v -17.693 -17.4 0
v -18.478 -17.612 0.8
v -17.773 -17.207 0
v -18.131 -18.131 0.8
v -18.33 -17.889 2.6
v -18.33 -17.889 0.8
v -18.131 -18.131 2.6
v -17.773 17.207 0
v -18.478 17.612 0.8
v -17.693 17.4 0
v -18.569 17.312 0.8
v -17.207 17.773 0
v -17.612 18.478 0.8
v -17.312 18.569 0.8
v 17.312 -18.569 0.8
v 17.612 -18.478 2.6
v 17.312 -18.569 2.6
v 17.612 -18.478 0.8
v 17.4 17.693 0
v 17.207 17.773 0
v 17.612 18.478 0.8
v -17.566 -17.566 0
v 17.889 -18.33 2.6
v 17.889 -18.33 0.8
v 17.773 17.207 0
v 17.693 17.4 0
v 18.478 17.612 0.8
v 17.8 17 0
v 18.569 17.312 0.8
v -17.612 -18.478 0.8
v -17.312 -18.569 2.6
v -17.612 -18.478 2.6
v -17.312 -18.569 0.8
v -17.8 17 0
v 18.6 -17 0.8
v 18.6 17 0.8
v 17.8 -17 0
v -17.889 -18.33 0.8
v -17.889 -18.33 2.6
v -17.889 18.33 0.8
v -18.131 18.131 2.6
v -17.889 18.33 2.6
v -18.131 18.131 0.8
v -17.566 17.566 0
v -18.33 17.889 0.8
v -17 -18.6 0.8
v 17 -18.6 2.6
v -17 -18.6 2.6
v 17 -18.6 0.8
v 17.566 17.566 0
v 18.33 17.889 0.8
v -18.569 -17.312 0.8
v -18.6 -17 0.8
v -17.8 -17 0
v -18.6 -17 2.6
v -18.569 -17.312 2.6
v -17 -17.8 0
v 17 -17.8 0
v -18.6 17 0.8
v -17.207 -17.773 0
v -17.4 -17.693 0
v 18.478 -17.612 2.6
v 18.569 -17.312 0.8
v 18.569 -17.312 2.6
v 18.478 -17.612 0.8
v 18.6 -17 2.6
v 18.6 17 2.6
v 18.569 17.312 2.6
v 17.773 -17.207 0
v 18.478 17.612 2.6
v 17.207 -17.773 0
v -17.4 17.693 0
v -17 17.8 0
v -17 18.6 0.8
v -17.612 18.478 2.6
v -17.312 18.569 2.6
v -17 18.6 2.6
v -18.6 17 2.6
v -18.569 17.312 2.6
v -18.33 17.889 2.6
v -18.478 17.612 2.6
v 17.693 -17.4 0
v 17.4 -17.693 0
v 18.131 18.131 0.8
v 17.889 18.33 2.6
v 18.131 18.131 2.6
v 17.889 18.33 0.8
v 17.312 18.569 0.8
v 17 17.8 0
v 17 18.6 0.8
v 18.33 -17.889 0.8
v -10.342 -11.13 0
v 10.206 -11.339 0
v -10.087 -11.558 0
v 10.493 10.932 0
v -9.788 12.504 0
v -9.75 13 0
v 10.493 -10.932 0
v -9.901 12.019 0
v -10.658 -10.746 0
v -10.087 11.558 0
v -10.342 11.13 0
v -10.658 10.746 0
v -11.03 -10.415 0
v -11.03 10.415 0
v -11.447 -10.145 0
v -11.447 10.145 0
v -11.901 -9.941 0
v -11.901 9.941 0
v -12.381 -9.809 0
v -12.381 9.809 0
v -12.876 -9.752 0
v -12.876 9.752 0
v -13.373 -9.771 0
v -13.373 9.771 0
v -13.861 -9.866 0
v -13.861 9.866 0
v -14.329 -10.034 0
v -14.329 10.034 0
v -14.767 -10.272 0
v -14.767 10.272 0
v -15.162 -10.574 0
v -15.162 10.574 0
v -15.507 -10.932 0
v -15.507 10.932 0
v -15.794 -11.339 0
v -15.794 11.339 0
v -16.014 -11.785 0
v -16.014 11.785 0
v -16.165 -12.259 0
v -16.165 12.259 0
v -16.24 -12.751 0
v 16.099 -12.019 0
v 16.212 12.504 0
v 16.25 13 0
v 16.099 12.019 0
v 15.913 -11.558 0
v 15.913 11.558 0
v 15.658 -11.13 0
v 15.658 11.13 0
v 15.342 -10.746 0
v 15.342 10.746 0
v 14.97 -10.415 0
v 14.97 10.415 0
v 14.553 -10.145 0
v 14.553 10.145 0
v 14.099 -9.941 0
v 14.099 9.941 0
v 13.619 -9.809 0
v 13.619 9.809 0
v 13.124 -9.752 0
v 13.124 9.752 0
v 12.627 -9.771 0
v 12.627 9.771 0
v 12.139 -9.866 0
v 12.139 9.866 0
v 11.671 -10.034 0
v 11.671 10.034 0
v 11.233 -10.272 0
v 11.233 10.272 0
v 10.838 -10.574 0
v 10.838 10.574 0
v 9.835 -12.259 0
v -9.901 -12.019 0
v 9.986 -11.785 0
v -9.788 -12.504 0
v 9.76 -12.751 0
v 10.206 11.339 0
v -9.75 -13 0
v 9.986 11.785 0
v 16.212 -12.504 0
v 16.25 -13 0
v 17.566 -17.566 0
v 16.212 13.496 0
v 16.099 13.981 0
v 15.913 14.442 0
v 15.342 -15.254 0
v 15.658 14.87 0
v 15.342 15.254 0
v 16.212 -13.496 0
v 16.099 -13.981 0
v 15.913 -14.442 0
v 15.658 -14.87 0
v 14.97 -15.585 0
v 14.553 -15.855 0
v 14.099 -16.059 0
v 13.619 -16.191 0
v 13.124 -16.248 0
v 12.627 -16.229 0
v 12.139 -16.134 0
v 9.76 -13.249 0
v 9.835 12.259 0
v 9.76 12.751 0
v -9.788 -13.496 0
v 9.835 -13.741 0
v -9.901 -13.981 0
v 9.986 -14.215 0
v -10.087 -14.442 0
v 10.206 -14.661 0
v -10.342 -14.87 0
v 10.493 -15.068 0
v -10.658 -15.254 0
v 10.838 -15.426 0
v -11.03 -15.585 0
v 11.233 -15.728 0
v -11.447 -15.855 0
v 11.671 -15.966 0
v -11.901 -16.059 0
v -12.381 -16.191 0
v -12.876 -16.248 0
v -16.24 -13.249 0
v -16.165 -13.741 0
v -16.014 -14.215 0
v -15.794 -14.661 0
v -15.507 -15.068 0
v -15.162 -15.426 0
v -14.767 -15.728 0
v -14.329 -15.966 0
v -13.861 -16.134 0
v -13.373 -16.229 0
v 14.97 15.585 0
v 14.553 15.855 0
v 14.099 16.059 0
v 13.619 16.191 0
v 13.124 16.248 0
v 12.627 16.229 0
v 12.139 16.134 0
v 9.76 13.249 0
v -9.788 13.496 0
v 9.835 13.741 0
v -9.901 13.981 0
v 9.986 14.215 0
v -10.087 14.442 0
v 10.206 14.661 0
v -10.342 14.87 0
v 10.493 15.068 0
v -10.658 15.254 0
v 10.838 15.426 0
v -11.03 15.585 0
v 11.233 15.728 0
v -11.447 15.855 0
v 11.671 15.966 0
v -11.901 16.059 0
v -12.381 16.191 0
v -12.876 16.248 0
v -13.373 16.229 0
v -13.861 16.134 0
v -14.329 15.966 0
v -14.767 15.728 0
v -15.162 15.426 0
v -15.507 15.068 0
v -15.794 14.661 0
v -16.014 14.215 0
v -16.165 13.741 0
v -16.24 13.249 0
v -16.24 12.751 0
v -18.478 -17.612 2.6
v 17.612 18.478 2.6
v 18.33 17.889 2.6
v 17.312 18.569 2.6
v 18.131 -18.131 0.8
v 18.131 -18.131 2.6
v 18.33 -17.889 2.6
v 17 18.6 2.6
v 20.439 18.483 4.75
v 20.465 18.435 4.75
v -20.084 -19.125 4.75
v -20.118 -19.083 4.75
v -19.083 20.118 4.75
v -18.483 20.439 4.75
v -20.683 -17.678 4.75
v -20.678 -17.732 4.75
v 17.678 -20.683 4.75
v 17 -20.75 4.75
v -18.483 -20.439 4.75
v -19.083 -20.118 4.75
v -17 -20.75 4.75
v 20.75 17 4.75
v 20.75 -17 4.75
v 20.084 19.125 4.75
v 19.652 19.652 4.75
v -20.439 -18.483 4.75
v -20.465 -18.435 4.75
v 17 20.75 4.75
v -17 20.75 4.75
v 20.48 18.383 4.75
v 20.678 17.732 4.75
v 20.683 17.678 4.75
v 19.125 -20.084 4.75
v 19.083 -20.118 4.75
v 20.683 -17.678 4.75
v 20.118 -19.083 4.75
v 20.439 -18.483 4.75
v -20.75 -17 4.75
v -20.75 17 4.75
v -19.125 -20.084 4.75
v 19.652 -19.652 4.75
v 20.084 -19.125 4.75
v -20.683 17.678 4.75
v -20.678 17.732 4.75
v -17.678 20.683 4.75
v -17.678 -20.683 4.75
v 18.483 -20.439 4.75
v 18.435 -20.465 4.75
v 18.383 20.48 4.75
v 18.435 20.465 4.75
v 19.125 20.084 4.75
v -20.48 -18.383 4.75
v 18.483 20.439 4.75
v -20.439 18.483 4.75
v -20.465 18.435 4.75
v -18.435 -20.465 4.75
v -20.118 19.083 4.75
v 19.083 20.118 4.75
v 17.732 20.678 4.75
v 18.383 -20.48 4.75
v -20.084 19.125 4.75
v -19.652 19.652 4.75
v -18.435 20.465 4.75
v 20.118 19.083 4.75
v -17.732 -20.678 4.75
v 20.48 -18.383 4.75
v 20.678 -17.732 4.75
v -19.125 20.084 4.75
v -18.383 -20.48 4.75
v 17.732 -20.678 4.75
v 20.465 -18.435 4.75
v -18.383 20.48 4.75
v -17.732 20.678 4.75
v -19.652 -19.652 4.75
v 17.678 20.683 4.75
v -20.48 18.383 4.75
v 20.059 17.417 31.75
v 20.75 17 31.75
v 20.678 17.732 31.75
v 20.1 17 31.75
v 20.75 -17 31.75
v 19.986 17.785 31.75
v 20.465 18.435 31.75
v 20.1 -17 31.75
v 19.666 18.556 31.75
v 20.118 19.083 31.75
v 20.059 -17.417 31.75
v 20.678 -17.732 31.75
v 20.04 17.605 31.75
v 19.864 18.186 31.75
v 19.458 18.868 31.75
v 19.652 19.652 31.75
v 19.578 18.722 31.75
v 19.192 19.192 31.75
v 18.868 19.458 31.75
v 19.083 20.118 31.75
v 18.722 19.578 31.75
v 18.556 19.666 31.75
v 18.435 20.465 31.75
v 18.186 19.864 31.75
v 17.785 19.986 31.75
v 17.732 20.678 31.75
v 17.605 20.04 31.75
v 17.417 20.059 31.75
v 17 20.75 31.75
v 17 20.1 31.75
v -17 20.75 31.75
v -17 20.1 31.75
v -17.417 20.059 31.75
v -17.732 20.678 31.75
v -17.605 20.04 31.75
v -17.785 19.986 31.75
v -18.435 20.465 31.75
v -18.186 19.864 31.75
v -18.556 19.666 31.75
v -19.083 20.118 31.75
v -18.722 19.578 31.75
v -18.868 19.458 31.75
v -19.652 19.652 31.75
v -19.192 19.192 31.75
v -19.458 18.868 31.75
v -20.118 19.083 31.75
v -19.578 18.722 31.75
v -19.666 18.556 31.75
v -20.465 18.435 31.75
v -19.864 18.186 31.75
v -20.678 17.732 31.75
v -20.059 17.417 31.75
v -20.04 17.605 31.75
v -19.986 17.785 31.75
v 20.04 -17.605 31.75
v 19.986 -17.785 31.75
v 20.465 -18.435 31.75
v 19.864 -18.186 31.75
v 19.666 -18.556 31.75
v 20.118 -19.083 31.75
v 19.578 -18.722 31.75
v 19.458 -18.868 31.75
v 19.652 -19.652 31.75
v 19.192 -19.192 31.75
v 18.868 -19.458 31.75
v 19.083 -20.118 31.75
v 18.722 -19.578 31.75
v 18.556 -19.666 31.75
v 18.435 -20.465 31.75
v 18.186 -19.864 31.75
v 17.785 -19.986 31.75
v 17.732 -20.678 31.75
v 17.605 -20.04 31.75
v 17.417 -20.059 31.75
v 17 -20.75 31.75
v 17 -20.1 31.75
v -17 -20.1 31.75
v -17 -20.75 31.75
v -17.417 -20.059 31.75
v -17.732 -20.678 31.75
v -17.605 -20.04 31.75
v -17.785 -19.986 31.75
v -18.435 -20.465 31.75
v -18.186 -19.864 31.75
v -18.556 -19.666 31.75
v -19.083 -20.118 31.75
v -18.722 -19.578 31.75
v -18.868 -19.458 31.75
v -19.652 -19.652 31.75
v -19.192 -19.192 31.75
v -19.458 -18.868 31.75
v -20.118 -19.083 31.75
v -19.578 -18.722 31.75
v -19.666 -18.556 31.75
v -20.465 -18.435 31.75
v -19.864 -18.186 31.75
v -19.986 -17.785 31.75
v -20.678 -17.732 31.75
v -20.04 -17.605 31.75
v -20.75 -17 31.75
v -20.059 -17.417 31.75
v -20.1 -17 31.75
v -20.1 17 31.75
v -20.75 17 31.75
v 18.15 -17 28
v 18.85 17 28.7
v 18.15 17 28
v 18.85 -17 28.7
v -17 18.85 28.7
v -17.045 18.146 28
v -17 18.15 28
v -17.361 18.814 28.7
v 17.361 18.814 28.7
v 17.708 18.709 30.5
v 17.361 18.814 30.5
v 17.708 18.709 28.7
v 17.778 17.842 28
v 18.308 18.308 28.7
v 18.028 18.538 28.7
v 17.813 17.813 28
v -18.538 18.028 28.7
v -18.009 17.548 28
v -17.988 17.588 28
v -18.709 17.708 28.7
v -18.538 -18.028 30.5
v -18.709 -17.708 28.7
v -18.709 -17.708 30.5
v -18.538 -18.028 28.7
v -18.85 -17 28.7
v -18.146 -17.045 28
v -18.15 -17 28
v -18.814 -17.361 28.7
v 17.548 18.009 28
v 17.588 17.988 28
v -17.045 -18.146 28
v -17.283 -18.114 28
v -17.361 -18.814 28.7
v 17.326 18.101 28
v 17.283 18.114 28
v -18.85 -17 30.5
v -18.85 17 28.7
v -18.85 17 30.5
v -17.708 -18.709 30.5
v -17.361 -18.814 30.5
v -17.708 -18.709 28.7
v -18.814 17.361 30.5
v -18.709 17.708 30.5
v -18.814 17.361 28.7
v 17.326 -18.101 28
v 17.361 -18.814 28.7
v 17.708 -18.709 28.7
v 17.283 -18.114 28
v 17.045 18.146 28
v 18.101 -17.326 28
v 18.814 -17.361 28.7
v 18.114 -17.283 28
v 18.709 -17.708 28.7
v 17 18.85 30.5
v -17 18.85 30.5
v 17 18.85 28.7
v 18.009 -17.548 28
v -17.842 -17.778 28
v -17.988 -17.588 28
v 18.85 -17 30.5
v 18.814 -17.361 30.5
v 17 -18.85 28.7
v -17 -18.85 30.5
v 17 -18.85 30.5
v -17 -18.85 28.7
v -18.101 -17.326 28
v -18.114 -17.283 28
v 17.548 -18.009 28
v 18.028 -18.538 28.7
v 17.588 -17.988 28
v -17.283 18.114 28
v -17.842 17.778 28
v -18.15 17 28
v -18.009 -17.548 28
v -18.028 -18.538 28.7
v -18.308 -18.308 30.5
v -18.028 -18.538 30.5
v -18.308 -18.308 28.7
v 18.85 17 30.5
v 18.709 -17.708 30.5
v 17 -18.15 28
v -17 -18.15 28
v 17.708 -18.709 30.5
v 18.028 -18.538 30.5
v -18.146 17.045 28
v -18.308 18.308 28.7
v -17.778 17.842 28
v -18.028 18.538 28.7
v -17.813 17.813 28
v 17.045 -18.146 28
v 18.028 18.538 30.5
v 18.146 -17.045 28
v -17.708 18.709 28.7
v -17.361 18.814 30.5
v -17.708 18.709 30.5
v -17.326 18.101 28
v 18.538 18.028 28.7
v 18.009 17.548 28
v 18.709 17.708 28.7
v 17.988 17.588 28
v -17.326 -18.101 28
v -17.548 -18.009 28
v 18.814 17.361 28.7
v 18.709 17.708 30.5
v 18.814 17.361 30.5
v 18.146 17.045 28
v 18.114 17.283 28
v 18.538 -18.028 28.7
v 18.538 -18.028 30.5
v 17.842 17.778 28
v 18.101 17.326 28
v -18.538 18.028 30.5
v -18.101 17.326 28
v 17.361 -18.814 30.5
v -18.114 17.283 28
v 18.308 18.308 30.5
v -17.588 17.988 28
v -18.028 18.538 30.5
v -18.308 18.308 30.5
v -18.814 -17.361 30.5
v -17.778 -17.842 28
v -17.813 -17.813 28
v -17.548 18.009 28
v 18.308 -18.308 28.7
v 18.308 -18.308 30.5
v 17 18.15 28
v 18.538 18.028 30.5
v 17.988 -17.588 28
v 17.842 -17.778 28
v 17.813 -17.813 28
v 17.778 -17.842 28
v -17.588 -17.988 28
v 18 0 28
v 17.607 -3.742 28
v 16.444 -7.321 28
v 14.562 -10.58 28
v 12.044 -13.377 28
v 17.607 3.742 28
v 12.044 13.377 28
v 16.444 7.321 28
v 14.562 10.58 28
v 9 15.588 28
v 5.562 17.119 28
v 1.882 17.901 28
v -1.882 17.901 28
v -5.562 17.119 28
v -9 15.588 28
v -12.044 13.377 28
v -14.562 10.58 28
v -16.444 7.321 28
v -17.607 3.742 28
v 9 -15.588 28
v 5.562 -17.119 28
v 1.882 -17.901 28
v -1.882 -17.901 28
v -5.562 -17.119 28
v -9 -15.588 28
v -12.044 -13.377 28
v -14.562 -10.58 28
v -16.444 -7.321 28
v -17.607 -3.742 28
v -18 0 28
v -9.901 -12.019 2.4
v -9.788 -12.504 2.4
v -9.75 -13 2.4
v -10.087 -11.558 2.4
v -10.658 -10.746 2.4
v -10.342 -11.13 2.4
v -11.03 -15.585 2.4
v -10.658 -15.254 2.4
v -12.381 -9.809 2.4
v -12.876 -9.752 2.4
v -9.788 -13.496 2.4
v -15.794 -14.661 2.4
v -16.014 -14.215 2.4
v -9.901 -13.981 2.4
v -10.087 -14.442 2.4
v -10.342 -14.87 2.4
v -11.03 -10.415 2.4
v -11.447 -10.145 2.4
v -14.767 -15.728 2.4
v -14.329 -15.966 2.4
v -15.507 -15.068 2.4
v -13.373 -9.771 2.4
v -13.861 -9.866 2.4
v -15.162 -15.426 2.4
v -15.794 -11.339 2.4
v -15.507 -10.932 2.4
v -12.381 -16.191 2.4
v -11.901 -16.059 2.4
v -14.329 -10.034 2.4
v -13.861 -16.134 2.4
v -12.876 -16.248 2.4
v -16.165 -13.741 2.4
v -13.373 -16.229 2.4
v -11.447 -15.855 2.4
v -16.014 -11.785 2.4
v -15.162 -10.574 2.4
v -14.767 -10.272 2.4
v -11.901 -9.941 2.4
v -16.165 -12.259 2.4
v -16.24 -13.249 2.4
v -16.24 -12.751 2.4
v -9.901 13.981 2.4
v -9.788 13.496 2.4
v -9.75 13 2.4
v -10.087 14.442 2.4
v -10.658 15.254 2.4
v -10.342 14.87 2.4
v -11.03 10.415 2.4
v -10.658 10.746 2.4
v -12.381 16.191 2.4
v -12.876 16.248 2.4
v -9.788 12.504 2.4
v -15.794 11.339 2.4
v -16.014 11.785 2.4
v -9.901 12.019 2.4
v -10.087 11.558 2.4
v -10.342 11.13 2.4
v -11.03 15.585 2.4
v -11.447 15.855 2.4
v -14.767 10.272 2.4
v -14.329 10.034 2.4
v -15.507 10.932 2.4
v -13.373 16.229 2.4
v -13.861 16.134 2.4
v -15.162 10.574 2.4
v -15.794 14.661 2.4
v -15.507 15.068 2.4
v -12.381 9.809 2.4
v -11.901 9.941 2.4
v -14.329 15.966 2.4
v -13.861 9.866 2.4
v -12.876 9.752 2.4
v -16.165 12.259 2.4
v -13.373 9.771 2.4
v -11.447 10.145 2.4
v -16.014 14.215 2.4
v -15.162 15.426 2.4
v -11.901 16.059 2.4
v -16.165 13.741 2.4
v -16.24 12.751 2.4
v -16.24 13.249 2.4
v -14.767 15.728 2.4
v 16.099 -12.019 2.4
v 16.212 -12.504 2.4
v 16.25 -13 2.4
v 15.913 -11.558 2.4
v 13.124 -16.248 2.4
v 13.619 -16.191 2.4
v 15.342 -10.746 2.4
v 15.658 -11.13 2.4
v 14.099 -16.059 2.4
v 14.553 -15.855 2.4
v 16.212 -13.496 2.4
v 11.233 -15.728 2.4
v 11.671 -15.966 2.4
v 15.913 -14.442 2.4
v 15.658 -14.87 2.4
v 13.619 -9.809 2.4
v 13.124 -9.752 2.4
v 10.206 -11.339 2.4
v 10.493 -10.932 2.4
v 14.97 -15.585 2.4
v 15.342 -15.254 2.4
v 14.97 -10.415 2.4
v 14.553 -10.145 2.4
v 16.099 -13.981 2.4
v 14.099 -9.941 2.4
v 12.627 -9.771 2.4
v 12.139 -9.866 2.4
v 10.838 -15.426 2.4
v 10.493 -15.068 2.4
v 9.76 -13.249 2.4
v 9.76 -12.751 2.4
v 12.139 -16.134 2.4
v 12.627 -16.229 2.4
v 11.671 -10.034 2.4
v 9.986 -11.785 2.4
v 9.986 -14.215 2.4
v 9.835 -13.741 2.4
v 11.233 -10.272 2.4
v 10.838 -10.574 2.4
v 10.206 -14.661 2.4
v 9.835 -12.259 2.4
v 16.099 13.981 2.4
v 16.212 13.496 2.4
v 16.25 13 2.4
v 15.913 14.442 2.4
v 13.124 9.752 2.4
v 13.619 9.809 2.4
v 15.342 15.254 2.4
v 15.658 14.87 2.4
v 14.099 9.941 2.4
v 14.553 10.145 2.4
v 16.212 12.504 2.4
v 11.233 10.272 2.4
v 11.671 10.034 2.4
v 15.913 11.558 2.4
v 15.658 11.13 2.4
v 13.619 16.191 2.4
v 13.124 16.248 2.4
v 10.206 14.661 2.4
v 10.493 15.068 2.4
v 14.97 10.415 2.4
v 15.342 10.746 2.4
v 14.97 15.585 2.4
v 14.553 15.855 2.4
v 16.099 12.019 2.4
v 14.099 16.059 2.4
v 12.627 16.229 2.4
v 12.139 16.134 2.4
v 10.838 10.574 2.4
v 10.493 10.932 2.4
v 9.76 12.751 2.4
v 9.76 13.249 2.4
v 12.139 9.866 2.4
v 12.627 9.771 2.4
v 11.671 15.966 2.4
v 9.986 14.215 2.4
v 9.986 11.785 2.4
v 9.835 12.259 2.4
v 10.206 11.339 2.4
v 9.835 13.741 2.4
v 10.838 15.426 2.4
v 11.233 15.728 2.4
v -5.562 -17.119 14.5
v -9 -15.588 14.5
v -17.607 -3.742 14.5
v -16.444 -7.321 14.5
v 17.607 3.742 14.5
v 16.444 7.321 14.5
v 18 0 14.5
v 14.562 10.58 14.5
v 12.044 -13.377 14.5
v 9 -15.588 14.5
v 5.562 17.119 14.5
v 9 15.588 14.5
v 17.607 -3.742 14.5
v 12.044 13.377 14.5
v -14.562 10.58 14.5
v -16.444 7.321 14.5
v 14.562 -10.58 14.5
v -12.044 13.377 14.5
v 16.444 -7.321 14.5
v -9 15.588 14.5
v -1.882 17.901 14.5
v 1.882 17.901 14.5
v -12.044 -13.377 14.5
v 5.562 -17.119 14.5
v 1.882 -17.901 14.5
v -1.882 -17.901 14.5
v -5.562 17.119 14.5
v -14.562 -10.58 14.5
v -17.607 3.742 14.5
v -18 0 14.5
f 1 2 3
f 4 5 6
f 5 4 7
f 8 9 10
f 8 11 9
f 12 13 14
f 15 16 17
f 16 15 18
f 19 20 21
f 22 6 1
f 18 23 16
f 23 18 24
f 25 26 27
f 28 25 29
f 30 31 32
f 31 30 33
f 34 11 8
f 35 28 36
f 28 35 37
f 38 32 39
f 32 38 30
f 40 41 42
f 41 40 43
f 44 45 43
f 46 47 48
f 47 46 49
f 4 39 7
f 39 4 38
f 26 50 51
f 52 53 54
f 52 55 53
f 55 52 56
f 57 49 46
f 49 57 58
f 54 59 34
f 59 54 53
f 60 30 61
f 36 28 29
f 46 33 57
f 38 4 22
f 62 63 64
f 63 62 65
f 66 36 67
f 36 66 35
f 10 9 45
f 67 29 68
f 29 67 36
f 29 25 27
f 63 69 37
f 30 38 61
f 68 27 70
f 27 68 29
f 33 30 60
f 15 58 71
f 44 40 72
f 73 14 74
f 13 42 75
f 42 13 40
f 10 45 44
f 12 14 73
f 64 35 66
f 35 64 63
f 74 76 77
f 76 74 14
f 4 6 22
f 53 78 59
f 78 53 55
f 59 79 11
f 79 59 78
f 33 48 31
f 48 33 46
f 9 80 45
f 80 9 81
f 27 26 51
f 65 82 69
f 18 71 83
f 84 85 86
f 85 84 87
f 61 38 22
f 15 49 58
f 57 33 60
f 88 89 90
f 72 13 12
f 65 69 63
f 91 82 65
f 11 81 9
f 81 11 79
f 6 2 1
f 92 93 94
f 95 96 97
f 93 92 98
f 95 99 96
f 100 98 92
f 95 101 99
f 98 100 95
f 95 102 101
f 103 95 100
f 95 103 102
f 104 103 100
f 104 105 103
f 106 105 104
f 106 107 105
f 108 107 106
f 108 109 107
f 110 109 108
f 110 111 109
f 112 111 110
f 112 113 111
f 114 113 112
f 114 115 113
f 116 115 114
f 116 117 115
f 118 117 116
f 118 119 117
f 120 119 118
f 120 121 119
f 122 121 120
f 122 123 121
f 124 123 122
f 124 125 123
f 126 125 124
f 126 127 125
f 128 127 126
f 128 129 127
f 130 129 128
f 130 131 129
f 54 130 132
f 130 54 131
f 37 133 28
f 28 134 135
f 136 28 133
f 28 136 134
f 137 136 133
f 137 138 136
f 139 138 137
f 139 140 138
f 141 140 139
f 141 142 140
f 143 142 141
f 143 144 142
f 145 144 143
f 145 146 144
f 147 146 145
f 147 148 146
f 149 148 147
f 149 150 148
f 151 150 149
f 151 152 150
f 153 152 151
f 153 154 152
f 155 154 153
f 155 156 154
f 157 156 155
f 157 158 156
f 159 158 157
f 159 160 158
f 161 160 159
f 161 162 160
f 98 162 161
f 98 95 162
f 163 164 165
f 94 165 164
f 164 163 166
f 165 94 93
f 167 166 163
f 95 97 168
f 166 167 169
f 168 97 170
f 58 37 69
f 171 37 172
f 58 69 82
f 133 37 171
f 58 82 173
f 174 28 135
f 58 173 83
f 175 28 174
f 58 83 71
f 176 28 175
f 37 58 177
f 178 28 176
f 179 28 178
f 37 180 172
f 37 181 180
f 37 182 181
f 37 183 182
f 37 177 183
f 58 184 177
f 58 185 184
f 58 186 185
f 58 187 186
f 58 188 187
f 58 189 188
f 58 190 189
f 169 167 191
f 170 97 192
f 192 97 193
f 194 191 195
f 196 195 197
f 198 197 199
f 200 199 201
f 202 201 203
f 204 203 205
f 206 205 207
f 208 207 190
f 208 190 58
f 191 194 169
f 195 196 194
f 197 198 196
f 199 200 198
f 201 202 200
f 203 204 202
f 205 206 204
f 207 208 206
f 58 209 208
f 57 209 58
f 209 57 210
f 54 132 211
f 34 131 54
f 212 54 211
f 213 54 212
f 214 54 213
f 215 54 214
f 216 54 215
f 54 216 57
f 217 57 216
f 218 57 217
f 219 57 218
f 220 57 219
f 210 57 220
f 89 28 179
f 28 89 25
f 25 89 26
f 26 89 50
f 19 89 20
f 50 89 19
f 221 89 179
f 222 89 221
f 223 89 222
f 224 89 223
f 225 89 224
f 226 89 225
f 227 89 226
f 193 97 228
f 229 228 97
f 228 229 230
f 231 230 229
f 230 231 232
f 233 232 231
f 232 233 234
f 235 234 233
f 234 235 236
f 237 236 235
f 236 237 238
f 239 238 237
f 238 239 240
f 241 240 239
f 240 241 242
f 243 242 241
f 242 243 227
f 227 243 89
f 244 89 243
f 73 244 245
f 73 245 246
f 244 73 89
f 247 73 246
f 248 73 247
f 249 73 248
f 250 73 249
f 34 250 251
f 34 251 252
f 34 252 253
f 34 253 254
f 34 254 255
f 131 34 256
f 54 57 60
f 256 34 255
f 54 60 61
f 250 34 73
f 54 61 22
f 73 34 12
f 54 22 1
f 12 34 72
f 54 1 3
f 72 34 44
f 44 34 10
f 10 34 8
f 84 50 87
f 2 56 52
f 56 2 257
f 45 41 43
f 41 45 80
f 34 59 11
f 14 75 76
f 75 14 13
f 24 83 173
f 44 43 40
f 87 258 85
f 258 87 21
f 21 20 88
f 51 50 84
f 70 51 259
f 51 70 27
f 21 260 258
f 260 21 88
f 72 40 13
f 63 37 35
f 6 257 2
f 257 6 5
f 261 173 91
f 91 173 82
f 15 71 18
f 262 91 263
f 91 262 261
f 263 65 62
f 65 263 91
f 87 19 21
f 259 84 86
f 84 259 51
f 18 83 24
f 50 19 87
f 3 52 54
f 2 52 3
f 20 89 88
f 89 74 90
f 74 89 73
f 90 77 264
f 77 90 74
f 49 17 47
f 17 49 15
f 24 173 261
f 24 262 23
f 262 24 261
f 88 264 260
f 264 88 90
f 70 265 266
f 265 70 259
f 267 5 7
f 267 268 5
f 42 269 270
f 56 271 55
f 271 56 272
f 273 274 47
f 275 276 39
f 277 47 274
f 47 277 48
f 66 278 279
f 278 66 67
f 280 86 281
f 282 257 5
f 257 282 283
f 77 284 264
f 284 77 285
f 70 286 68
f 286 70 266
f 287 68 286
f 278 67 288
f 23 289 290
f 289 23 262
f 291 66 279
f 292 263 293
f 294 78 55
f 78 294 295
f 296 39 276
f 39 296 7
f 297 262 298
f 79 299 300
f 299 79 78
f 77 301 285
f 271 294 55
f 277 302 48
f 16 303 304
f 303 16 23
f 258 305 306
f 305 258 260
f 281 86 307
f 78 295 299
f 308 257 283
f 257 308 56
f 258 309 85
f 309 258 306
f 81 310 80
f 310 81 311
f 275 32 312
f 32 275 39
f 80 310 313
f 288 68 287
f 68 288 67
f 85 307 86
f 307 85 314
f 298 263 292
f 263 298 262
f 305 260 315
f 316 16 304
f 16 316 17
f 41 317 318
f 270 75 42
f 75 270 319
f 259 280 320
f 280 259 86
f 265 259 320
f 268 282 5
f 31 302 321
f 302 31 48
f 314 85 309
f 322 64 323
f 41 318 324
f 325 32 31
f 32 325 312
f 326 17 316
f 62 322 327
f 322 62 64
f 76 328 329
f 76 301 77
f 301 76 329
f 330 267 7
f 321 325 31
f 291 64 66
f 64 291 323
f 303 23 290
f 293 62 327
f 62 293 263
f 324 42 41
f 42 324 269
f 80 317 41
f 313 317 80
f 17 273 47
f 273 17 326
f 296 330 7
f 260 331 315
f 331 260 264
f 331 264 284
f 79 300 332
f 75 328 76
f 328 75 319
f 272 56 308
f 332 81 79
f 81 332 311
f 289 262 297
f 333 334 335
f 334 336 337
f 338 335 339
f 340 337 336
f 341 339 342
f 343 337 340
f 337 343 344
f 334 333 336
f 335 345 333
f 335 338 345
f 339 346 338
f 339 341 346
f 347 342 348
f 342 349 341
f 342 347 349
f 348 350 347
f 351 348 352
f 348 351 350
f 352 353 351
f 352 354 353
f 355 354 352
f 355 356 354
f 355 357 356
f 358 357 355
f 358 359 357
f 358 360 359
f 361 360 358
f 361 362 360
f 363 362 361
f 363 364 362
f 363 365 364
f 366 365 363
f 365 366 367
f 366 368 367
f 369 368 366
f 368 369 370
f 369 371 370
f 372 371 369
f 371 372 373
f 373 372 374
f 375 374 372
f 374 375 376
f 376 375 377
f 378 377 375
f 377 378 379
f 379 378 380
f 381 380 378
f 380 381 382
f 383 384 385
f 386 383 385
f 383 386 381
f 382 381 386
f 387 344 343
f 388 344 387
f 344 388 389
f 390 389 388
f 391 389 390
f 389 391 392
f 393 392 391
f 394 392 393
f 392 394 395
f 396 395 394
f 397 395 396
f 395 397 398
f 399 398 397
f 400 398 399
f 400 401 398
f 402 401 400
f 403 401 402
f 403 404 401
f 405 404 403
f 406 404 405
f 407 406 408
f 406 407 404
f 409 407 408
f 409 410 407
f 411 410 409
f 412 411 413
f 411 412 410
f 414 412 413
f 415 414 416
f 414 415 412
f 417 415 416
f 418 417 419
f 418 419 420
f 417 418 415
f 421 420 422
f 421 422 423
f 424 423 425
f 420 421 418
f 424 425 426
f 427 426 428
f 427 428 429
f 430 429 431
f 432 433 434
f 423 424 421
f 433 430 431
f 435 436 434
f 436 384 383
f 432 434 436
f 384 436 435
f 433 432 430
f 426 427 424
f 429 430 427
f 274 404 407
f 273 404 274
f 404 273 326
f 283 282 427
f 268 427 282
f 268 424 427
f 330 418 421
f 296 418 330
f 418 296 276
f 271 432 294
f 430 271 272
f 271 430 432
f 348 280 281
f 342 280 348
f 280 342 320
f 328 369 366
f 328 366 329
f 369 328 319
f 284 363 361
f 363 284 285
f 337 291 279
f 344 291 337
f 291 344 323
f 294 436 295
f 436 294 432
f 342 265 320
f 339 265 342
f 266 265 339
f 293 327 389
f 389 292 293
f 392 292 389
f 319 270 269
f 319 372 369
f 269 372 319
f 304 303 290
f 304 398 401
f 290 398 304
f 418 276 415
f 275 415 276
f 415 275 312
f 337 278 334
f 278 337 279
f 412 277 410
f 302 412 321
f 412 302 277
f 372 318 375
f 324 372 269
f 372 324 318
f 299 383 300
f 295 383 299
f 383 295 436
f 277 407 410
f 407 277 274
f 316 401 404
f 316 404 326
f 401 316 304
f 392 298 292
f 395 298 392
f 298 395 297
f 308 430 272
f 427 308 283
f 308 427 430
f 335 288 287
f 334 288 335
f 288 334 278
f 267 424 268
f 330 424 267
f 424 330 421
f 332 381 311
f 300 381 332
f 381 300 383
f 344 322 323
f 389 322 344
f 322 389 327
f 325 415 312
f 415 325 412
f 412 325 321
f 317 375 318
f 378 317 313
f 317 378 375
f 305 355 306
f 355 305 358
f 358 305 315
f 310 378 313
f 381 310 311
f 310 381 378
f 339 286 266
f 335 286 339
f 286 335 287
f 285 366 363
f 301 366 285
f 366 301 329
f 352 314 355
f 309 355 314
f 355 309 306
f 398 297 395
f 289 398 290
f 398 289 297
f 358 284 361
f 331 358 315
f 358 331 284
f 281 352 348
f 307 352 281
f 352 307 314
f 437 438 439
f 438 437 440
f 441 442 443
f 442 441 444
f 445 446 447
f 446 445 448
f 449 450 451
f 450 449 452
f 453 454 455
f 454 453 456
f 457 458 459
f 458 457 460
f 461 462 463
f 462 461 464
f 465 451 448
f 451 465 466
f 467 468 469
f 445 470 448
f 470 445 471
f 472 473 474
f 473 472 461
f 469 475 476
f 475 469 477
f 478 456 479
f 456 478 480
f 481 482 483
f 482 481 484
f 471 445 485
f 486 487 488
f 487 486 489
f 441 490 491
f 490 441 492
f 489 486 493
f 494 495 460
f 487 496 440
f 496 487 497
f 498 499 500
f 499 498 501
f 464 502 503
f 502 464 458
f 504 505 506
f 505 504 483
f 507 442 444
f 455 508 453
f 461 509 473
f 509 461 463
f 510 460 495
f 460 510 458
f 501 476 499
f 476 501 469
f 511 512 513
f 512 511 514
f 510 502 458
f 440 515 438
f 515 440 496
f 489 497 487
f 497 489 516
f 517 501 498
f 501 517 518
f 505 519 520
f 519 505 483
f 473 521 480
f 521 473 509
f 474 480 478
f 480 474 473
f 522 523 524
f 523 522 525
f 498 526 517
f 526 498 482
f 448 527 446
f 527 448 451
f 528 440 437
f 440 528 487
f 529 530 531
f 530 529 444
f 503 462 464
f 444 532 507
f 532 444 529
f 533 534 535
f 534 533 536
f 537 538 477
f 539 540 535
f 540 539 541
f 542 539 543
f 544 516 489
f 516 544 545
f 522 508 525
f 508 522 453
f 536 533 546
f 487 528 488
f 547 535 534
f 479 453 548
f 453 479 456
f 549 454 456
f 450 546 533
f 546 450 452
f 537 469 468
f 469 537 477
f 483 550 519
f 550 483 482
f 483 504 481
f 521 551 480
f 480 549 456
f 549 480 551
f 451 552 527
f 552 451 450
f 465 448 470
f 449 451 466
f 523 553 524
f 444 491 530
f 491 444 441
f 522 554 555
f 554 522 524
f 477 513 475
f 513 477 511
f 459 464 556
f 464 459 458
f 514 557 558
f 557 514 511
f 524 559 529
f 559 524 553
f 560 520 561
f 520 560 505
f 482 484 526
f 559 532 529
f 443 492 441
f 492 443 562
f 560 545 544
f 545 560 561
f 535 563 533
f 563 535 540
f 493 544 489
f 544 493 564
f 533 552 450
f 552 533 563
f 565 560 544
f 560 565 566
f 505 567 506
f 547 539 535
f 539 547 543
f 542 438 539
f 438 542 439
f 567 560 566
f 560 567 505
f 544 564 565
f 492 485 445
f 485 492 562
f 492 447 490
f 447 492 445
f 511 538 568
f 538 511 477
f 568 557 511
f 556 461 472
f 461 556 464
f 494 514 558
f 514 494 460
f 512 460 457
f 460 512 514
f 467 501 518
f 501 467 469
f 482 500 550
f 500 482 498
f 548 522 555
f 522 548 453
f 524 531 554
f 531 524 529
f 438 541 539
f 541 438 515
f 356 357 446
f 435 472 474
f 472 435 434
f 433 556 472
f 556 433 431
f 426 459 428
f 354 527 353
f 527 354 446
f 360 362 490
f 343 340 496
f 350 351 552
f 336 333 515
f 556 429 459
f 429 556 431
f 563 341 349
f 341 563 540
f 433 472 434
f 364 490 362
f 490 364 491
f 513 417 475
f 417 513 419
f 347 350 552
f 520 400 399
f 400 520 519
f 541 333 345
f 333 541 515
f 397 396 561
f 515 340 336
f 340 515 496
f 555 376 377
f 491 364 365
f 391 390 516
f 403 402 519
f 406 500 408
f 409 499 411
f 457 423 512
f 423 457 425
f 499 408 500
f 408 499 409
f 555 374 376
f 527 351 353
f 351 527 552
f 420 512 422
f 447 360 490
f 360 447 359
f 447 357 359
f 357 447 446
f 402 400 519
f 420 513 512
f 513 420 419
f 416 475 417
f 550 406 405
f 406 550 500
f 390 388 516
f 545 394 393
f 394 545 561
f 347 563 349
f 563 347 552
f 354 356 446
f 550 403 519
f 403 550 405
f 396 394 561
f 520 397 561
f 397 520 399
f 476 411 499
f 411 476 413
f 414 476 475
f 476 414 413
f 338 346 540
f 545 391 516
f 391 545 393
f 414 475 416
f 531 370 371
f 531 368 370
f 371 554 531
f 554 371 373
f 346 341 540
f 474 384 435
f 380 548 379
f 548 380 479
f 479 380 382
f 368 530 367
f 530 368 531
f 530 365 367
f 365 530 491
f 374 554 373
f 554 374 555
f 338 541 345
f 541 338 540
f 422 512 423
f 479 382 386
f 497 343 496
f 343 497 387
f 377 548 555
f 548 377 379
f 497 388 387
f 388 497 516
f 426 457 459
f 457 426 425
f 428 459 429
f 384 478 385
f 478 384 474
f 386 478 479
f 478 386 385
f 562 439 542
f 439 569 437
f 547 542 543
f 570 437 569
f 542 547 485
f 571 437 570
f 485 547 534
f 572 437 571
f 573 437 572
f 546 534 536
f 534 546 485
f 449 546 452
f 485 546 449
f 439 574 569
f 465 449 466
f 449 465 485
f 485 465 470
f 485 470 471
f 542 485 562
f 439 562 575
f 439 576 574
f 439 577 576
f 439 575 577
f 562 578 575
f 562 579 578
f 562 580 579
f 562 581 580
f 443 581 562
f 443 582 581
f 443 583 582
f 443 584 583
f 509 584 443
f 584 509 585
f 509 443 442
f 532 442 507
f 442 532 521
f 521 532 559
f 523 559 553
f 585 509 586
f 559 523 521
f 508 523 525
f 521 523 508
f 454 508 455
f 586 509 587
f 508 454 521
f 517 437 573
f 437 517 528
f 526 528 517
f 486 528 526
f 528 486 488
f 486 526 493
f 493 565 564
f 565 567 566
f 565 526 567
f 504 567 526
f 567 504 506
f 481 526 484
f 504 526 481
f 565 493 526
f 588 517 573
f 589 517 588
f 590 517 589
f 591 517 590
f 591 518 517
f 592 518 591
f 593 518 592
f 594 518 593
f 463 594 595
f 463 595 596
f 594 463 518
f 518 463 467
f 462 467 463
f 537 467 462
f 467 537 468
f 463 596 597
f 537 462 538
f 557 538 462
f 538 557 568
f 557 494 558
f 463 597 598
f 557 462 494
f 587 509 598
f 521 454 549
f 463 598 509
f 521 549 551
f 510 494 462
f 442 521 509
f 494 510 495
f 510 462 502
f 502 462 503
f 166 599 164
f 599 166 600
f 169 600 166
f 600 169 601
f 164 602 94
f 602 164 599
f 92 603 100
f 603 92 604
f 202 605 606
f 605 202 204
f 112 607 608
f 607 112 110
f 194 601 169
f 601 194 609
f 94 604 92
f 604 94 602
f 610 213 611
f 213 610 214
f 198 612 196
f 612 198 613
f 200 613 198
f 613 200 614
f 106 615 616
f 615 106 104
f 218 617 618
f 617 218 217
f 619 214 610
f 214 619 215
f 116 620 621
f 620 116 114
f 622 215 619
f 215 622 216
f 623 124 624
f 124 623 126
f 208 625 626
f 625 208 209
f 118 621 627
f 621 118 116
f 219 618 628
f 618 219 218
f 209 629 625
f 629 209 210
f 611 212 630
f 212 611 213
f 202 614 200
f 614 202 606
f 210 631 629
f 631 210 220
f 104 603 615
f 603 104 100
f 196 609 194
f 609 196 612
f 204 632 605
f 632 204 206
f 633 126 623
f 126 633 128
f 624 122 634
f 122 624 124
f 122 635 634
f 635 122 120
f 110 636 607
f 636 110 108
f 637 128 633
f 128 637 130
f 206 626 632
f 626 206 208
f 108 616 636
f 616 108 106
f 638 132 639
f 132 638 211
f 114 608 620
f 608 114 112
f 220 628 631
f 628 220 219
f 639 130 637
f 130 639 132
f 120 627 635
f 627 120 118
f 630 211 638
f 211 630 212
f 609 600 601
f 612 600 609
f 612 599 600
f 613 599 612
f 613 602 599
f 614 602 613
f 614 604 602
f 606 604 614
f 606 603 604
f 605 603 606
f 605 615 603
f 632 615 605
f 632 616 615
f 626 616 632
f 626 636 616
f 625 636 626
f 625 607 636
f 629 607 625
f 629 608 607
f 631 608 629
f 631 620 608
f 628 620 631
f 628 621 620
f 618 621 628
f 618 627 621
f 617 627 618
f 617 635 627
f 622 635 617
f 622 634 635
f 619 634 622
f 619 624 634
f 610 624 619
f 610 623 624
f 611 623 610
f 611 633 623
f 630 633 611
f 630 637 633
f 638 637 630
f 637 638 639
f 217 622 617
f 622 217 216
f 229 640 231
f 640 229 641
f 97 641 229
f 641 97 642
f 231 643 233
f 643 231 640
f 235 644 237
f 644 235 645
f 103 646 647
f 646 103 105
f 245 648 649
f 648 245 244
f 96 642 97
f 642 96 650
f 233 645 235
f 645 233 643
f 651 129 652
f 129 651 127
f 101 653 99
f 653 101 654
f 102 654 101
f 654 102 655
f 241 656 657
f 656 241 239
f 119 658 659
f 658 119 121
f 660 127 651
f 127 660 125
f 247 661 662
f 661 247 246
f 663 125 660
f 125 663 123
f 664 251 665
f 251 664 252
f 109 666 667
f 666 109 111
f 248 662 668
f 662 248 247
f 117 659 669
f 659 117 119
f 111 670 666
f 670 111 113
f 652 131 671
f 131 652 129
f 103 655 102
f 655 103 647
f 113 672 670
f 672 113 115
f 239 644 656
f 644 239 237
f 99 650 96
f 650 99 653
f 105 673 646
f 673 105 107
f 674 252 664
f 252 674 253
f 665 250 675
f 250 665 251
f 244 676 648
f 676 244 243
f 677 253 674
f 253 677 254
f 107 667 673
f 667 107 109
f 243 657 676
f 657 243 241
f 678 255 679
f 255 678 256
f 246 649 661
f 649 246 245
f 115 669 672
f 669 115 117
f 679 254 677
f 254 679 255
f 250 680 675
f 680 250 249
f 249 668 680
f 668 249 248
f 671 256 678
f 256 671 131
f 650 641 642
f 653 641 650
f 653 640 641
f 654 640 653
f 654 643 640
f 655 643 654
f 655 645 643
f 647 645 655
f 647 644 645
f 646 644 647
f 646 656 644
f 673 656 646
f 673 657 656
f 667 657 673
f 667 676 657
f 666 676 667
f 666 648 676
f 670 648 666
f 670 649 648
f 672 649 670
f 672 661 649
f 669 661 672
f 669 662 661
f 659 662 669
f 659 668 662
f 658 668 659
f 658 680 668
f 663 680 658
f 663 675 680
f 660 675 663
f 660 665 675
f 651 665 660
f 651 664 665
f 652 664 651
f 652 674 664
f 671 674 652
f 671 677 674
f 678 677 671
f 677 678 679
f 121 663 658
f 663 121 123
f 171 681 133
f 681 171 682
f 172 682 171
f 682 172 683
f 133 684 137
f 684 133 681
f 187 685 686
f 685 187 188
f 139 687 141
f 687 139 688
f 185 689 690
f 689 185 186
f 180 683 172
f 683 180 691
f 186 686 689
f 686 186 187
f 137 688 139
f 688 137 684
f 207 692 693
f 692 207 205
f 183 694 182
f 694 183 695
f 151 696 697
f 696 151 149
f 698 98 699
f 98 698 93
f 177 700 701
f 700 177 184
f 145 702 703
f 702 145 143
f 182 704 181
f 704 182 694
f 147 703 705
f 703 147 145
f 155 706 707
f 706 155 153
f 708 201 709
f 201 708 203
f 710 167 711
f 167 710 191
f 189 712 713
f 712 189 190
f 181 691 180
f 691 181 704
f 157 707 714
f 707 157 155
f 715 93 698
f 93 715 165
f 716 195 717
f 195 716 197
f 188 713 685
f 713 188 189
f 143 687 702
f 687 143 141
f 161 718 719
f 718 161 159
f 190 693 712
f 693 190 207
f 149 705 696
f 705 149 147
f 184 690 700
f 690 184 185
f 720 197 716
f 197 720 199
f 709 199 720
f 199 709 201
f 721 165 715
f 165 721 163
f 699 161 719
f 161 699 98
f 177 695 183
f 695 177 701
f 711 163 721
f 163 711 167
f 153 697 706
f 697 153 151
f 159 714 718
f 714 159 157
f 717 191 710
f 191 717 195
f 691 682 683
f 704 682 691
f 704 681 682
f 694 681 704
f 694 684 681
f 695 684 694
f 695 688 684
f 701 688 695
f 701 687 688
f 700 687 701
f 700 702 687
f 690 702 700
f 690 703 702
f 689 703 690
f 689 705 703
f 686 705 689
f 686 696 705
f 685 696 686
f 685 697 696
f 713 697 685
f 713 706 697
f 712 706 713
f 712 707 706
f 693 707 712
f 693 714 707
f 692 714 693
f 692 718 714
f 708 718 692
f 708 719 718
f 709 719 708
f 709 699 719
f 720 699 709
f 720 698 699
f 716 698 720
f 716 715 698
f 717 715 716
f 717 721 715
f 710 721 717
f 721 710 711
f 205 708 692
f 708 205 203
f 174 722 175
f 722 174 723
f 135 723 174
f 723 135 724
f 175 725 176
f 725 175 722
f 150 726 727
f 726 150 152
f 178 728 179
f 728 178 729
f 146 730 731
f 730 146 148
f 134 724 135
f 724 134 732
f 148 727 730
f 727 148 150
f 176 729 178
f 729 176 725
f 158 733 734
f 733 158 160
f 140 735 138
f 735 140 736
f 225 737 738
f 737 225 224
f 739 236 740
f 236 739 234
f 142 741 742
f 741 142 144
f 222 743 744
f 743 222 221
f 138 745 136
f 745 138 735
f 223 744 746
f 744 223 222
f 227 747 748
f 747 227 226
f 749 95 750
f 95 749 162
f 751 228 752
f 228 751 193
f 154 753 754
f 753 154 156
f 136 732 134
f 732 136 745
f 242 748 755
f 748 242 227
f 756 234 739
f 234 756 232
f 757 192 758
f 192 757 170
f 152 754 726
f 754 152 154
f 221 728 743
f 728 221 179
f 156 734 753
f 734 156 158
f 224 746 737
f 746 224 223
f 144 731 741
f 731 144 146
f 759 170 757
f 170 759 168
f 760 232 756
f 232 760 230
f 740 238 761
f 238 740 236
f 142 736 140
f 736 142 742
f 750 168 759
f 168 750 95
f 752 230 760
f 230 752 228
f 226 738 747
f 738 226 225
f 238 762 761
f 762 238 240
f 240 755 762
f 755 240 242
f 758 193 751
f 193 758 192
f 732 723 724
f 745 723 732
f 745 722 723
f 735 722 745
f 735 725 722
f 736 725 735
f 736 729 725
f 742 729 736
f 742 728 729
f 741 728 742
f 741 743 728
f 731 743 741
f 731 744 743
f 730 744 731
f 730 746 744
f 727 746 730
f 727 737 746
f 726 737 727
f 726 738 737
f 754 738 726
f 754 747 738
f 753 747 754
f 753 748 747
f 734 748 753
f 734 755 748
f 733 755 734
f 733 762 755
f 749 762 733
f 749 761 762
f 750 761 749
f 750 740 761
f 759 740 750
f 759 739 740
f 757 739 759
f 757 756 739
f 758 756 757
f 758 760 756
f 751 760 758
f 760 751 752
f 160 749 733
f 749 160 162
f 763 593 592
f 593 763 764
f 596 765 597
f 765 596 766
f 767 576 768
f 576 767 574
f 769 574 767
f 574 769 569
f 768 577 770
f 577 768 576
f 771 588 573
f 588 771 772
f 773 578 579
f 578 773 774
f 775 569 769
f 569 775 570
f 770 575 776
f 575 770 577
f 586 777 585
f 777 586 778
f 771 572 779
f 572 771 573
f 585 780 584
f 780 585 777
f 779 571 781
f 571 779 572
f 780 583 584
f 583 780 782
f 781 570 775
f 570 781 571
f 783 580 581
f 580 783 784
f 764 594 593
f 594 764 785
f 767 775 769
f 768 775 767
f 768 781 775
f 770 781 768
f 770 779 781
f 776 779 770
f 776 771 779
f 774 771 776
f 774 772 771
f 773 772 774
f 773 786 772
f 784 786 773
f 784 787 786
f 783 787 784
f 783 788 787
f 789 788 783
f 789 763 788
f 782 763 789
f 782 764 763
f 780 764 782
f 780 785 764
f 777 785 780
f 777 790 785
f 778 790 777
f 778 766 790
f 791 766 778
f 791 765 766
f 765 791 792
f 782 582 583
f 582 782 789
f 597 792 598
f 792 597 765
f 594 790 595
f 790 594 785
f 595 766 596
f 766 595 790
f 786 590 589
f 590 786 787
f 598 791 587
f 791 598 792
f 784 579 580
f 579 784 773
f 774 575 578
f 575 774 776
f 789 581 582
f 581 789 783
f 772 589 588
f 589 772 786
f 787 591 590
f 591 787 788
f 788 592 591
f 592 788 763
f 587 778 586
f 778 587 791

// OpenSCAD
include <../../gridfinity_openscad/gridfinity_modules.scad>

diameter = 36;
height = 97;

difference() {
  grid_block(1,1,4, screw_depth = 0,center = true, box_corner_attachments_only = false);

	translate([0,0,height/2+6])
		cylinder(80,diameter/2,diameter/2,true);
}
